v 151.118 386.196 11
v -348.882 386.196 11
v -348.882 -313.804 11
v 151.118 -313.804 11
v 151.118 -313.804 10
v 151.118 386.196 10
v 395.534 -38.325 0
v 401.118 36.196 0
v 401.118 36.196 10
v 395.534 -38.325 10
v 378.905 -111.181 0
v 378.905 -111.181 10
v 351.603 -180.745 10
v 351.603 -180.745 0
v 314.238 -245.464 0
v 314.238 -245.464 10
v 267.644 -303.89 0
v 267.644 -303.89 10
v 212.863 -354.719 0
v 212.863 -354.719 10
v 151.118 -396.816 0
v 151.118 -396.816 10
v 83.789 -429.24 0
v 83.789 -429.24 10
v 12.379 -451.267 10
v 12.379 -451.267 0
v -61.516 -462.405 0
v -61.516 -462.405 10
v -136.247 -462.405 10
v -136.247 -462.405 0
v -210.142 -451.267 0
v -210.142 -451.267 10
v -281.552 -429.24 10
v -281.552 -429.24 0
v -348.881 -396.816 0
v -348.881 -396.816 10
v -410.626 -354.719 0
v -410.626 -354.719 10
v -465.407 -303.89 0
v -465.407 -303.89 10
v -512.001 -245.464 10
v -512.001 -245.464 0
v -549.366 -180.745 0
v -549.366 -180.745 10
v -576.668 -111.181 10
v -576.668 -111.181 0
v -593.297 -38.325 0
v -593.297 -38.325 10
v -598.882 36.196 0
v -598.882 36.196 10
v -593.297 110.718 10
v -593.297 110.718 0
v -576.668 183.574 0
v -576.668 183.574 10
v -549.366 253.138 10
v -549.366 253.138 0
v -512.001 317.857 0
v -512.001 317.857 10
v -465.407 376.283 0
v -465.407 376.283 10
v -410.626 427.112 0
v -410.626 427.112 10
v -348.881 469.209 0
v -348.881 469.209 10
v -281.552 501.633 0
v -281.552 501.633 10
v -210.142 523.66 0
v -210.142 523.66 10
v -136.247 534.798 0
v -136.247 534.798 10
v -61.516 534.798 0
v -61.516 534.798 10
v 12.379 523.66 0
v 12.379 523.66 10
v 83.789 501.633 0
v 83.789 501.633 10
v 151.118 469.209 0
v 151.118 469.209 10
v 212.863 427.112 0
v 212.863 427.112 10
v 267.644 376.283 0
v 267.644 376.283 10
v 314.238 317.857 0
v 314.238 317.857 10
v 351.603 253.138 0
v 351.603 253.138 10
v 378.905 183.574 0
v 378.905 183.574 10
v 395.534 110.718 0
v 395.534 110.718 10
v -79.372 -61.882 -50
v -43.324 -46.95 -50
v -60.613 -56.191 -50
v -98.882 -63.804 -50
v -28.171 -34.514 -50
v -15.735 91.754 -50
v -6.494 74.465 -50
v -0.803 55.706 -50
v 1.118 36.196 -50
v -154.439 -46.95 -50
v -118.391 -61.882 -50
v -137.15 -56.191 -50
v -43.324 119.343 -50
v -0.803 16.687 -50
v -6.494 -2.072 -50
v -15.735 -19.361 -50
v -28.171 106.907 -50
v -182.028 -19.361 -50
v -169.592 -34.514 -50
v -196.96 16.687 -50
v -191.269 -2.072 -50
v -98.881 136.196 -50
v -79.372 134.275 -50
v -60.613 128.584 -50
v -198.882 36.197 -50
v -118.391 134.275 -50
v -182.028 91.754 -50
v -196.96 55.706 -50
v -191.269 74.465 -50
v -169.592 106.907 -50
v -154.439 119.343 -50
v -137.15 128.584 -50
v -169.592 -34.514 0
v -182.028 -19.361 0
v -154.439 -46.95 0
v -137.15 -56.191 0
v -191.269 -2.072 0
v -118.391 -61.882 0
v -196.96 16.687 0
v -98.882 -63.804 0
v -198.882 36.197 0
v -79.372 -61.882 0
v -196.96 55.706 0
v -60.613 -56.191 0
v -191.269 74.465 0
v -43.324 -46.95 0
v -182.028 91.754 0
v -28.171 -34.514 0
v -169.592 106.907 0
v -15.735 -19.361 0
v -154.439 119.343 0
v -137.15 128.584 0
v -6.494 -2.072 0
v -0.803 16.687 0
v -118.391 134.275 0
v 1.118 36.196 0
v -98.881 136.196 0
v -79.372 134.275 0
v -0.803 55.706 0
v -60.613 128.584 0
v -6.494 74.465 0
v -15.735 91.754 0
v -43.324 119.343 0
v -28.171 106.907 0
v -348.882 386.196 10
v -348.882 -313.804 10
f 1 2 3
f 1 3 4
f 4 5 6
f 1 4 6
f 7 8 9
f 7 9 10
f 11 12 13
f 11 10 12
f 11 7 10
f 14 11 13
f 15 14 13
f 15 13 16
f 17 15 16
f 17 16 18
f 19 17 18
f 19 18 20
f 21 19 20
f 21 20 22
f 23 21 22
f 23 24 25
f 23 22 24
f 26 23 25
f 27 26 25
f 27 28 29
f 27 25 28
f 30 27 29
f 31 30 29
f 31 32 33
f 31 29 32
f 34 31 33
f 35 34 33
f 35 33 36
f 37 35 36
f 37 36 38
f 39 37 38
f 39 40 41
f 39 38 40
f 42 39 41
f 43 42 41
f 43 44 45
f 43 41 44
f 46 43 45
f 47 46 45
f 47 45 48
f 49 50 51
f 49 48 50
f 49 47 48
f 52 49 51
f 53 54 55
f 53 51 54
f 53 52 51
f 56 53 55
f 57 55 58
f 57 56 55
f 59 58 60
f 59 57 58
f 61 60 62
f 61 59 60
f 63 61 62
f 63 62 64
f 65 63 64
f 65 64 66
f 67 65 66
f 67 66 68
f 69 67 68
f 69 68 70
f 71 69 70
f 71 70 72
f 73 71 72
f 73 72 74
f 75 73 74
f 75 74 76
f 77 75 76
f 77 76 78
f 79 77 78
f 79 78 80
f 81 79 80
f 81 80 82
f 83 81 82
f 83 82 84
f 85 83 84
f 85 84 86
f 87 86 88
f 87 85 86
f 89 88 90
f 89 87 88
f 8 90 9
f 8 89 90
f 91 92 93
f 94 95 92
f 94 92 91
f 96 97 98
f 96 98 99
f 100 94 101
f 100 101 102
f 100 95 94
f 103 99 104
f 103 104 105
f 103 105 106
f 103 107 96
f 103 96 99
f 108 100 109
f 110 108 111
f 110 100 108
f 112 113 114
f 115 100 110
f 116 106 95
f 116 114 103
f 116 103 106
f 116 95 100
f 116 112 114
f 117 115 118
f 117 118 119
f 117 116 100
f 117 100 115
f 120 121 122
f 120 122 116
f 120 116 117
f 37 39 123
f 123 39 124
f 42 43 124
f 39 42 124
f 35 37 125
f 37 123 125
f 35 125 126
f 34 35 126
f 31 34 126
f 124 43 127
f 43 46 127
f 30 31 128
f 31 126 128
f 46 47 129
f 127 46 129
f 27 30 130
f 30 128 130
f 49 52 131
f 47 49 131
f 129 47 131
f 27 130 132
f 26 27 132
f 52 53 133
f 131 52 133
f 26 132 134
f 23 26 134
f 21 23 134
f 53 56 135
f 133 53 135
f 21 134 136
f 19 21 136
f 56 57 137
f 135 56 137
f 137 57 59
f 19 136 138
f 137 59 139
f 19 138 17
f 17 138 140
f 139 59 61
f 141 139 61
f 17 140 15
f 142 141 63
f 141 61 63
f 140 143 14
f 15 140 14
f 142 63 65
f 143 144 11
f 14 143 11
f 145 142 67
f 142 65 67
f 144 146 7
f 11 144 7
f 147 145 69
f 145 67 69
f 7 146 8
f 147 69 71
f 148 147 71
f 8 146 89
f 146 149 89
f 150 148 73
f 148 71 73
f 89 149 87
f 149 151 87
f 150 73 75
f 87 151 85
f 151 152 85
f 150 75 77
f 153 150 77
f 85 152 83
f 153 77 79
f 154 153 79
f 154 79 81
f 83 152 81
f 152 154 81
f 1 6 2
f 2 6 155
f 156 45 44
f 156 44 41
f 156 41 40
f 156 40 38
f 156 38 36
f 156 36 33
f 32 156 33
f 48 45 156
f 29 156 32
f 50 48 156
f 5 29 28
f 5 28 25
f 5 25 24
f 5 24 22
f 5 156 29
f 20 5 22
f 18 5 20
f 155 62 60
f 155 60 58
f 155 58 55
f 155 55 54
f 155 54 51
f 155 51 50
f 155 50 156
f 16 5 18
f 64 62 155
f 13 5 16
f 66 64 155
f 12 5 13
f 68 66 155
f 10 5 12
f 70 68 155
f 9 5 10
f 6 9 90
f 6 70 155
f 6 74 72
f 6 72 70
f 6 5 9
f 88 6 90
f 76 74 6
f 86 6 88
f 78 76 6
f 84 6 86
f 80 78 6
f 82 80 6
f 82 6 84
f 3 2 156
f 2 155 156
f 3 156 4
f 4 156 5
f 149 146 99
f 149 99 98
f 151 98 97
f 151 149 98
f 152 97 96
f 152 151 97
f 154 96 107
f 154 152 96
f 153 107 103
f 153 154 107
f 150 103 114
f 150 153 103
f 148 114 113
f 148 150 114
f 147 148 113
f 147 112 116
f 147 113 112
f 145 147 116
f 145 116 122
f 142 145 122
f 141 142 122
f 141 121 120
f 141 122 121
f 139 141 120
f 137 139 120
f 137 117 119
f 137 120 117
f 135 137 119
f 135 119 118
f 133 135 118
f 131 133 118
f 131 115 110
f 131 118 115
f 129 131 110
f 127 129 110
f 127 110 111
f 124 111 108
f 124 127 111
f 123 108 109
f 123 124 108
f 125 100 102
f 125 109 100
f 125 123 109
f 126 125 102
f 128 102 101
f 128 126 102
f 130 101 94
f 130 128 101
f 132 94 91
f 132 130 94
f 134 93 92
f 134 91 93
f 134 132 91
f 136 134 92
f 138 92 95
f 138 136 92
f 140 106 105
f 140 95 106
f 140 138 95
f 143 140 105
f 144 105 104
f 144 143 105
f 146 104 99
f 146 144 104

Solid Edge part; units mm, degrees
sketch "Sketch1" plane through (0, 0, 0) normal (0, 0, 1) x (1, 0, 0)
  circle A0 centre (-98.8815, 36.1965) radius 500
  dimension "D1" = 1000
extrude "Protrusion1" add sketch "Sketch1" along normal blind 10
sketch "Sketch2" plane through (-98.8815, 36.1965, 0) normal (0, 0, -1) x (1, 0, 0)
  circle A0 centre (0, 0) radius 100
  dimension "D1" = 200
extrude "ExtrudedProtrusion_2" add sketch "Sketch2" along normal blind 50
sketch "Sketch3" plane through (-98.8815, 36.1965, 10) normal (0, 0, 1) x (1, 0, 0)
  line L0 (-250, 350) -> (-250, -350)
  line L1 (-250, -350) -> (250, -350)
  line L2 (250, -350) -> (250, 350)
  line L3 (250, 350) -> (-250, 350)
  dimension "D1" = 500
  dimension "D2" = 700
extrude "ExtrudedProtrusion_3" add sketch "Sketch3" along normal blind 1
properties material "Aluminum, 6061-T6"
